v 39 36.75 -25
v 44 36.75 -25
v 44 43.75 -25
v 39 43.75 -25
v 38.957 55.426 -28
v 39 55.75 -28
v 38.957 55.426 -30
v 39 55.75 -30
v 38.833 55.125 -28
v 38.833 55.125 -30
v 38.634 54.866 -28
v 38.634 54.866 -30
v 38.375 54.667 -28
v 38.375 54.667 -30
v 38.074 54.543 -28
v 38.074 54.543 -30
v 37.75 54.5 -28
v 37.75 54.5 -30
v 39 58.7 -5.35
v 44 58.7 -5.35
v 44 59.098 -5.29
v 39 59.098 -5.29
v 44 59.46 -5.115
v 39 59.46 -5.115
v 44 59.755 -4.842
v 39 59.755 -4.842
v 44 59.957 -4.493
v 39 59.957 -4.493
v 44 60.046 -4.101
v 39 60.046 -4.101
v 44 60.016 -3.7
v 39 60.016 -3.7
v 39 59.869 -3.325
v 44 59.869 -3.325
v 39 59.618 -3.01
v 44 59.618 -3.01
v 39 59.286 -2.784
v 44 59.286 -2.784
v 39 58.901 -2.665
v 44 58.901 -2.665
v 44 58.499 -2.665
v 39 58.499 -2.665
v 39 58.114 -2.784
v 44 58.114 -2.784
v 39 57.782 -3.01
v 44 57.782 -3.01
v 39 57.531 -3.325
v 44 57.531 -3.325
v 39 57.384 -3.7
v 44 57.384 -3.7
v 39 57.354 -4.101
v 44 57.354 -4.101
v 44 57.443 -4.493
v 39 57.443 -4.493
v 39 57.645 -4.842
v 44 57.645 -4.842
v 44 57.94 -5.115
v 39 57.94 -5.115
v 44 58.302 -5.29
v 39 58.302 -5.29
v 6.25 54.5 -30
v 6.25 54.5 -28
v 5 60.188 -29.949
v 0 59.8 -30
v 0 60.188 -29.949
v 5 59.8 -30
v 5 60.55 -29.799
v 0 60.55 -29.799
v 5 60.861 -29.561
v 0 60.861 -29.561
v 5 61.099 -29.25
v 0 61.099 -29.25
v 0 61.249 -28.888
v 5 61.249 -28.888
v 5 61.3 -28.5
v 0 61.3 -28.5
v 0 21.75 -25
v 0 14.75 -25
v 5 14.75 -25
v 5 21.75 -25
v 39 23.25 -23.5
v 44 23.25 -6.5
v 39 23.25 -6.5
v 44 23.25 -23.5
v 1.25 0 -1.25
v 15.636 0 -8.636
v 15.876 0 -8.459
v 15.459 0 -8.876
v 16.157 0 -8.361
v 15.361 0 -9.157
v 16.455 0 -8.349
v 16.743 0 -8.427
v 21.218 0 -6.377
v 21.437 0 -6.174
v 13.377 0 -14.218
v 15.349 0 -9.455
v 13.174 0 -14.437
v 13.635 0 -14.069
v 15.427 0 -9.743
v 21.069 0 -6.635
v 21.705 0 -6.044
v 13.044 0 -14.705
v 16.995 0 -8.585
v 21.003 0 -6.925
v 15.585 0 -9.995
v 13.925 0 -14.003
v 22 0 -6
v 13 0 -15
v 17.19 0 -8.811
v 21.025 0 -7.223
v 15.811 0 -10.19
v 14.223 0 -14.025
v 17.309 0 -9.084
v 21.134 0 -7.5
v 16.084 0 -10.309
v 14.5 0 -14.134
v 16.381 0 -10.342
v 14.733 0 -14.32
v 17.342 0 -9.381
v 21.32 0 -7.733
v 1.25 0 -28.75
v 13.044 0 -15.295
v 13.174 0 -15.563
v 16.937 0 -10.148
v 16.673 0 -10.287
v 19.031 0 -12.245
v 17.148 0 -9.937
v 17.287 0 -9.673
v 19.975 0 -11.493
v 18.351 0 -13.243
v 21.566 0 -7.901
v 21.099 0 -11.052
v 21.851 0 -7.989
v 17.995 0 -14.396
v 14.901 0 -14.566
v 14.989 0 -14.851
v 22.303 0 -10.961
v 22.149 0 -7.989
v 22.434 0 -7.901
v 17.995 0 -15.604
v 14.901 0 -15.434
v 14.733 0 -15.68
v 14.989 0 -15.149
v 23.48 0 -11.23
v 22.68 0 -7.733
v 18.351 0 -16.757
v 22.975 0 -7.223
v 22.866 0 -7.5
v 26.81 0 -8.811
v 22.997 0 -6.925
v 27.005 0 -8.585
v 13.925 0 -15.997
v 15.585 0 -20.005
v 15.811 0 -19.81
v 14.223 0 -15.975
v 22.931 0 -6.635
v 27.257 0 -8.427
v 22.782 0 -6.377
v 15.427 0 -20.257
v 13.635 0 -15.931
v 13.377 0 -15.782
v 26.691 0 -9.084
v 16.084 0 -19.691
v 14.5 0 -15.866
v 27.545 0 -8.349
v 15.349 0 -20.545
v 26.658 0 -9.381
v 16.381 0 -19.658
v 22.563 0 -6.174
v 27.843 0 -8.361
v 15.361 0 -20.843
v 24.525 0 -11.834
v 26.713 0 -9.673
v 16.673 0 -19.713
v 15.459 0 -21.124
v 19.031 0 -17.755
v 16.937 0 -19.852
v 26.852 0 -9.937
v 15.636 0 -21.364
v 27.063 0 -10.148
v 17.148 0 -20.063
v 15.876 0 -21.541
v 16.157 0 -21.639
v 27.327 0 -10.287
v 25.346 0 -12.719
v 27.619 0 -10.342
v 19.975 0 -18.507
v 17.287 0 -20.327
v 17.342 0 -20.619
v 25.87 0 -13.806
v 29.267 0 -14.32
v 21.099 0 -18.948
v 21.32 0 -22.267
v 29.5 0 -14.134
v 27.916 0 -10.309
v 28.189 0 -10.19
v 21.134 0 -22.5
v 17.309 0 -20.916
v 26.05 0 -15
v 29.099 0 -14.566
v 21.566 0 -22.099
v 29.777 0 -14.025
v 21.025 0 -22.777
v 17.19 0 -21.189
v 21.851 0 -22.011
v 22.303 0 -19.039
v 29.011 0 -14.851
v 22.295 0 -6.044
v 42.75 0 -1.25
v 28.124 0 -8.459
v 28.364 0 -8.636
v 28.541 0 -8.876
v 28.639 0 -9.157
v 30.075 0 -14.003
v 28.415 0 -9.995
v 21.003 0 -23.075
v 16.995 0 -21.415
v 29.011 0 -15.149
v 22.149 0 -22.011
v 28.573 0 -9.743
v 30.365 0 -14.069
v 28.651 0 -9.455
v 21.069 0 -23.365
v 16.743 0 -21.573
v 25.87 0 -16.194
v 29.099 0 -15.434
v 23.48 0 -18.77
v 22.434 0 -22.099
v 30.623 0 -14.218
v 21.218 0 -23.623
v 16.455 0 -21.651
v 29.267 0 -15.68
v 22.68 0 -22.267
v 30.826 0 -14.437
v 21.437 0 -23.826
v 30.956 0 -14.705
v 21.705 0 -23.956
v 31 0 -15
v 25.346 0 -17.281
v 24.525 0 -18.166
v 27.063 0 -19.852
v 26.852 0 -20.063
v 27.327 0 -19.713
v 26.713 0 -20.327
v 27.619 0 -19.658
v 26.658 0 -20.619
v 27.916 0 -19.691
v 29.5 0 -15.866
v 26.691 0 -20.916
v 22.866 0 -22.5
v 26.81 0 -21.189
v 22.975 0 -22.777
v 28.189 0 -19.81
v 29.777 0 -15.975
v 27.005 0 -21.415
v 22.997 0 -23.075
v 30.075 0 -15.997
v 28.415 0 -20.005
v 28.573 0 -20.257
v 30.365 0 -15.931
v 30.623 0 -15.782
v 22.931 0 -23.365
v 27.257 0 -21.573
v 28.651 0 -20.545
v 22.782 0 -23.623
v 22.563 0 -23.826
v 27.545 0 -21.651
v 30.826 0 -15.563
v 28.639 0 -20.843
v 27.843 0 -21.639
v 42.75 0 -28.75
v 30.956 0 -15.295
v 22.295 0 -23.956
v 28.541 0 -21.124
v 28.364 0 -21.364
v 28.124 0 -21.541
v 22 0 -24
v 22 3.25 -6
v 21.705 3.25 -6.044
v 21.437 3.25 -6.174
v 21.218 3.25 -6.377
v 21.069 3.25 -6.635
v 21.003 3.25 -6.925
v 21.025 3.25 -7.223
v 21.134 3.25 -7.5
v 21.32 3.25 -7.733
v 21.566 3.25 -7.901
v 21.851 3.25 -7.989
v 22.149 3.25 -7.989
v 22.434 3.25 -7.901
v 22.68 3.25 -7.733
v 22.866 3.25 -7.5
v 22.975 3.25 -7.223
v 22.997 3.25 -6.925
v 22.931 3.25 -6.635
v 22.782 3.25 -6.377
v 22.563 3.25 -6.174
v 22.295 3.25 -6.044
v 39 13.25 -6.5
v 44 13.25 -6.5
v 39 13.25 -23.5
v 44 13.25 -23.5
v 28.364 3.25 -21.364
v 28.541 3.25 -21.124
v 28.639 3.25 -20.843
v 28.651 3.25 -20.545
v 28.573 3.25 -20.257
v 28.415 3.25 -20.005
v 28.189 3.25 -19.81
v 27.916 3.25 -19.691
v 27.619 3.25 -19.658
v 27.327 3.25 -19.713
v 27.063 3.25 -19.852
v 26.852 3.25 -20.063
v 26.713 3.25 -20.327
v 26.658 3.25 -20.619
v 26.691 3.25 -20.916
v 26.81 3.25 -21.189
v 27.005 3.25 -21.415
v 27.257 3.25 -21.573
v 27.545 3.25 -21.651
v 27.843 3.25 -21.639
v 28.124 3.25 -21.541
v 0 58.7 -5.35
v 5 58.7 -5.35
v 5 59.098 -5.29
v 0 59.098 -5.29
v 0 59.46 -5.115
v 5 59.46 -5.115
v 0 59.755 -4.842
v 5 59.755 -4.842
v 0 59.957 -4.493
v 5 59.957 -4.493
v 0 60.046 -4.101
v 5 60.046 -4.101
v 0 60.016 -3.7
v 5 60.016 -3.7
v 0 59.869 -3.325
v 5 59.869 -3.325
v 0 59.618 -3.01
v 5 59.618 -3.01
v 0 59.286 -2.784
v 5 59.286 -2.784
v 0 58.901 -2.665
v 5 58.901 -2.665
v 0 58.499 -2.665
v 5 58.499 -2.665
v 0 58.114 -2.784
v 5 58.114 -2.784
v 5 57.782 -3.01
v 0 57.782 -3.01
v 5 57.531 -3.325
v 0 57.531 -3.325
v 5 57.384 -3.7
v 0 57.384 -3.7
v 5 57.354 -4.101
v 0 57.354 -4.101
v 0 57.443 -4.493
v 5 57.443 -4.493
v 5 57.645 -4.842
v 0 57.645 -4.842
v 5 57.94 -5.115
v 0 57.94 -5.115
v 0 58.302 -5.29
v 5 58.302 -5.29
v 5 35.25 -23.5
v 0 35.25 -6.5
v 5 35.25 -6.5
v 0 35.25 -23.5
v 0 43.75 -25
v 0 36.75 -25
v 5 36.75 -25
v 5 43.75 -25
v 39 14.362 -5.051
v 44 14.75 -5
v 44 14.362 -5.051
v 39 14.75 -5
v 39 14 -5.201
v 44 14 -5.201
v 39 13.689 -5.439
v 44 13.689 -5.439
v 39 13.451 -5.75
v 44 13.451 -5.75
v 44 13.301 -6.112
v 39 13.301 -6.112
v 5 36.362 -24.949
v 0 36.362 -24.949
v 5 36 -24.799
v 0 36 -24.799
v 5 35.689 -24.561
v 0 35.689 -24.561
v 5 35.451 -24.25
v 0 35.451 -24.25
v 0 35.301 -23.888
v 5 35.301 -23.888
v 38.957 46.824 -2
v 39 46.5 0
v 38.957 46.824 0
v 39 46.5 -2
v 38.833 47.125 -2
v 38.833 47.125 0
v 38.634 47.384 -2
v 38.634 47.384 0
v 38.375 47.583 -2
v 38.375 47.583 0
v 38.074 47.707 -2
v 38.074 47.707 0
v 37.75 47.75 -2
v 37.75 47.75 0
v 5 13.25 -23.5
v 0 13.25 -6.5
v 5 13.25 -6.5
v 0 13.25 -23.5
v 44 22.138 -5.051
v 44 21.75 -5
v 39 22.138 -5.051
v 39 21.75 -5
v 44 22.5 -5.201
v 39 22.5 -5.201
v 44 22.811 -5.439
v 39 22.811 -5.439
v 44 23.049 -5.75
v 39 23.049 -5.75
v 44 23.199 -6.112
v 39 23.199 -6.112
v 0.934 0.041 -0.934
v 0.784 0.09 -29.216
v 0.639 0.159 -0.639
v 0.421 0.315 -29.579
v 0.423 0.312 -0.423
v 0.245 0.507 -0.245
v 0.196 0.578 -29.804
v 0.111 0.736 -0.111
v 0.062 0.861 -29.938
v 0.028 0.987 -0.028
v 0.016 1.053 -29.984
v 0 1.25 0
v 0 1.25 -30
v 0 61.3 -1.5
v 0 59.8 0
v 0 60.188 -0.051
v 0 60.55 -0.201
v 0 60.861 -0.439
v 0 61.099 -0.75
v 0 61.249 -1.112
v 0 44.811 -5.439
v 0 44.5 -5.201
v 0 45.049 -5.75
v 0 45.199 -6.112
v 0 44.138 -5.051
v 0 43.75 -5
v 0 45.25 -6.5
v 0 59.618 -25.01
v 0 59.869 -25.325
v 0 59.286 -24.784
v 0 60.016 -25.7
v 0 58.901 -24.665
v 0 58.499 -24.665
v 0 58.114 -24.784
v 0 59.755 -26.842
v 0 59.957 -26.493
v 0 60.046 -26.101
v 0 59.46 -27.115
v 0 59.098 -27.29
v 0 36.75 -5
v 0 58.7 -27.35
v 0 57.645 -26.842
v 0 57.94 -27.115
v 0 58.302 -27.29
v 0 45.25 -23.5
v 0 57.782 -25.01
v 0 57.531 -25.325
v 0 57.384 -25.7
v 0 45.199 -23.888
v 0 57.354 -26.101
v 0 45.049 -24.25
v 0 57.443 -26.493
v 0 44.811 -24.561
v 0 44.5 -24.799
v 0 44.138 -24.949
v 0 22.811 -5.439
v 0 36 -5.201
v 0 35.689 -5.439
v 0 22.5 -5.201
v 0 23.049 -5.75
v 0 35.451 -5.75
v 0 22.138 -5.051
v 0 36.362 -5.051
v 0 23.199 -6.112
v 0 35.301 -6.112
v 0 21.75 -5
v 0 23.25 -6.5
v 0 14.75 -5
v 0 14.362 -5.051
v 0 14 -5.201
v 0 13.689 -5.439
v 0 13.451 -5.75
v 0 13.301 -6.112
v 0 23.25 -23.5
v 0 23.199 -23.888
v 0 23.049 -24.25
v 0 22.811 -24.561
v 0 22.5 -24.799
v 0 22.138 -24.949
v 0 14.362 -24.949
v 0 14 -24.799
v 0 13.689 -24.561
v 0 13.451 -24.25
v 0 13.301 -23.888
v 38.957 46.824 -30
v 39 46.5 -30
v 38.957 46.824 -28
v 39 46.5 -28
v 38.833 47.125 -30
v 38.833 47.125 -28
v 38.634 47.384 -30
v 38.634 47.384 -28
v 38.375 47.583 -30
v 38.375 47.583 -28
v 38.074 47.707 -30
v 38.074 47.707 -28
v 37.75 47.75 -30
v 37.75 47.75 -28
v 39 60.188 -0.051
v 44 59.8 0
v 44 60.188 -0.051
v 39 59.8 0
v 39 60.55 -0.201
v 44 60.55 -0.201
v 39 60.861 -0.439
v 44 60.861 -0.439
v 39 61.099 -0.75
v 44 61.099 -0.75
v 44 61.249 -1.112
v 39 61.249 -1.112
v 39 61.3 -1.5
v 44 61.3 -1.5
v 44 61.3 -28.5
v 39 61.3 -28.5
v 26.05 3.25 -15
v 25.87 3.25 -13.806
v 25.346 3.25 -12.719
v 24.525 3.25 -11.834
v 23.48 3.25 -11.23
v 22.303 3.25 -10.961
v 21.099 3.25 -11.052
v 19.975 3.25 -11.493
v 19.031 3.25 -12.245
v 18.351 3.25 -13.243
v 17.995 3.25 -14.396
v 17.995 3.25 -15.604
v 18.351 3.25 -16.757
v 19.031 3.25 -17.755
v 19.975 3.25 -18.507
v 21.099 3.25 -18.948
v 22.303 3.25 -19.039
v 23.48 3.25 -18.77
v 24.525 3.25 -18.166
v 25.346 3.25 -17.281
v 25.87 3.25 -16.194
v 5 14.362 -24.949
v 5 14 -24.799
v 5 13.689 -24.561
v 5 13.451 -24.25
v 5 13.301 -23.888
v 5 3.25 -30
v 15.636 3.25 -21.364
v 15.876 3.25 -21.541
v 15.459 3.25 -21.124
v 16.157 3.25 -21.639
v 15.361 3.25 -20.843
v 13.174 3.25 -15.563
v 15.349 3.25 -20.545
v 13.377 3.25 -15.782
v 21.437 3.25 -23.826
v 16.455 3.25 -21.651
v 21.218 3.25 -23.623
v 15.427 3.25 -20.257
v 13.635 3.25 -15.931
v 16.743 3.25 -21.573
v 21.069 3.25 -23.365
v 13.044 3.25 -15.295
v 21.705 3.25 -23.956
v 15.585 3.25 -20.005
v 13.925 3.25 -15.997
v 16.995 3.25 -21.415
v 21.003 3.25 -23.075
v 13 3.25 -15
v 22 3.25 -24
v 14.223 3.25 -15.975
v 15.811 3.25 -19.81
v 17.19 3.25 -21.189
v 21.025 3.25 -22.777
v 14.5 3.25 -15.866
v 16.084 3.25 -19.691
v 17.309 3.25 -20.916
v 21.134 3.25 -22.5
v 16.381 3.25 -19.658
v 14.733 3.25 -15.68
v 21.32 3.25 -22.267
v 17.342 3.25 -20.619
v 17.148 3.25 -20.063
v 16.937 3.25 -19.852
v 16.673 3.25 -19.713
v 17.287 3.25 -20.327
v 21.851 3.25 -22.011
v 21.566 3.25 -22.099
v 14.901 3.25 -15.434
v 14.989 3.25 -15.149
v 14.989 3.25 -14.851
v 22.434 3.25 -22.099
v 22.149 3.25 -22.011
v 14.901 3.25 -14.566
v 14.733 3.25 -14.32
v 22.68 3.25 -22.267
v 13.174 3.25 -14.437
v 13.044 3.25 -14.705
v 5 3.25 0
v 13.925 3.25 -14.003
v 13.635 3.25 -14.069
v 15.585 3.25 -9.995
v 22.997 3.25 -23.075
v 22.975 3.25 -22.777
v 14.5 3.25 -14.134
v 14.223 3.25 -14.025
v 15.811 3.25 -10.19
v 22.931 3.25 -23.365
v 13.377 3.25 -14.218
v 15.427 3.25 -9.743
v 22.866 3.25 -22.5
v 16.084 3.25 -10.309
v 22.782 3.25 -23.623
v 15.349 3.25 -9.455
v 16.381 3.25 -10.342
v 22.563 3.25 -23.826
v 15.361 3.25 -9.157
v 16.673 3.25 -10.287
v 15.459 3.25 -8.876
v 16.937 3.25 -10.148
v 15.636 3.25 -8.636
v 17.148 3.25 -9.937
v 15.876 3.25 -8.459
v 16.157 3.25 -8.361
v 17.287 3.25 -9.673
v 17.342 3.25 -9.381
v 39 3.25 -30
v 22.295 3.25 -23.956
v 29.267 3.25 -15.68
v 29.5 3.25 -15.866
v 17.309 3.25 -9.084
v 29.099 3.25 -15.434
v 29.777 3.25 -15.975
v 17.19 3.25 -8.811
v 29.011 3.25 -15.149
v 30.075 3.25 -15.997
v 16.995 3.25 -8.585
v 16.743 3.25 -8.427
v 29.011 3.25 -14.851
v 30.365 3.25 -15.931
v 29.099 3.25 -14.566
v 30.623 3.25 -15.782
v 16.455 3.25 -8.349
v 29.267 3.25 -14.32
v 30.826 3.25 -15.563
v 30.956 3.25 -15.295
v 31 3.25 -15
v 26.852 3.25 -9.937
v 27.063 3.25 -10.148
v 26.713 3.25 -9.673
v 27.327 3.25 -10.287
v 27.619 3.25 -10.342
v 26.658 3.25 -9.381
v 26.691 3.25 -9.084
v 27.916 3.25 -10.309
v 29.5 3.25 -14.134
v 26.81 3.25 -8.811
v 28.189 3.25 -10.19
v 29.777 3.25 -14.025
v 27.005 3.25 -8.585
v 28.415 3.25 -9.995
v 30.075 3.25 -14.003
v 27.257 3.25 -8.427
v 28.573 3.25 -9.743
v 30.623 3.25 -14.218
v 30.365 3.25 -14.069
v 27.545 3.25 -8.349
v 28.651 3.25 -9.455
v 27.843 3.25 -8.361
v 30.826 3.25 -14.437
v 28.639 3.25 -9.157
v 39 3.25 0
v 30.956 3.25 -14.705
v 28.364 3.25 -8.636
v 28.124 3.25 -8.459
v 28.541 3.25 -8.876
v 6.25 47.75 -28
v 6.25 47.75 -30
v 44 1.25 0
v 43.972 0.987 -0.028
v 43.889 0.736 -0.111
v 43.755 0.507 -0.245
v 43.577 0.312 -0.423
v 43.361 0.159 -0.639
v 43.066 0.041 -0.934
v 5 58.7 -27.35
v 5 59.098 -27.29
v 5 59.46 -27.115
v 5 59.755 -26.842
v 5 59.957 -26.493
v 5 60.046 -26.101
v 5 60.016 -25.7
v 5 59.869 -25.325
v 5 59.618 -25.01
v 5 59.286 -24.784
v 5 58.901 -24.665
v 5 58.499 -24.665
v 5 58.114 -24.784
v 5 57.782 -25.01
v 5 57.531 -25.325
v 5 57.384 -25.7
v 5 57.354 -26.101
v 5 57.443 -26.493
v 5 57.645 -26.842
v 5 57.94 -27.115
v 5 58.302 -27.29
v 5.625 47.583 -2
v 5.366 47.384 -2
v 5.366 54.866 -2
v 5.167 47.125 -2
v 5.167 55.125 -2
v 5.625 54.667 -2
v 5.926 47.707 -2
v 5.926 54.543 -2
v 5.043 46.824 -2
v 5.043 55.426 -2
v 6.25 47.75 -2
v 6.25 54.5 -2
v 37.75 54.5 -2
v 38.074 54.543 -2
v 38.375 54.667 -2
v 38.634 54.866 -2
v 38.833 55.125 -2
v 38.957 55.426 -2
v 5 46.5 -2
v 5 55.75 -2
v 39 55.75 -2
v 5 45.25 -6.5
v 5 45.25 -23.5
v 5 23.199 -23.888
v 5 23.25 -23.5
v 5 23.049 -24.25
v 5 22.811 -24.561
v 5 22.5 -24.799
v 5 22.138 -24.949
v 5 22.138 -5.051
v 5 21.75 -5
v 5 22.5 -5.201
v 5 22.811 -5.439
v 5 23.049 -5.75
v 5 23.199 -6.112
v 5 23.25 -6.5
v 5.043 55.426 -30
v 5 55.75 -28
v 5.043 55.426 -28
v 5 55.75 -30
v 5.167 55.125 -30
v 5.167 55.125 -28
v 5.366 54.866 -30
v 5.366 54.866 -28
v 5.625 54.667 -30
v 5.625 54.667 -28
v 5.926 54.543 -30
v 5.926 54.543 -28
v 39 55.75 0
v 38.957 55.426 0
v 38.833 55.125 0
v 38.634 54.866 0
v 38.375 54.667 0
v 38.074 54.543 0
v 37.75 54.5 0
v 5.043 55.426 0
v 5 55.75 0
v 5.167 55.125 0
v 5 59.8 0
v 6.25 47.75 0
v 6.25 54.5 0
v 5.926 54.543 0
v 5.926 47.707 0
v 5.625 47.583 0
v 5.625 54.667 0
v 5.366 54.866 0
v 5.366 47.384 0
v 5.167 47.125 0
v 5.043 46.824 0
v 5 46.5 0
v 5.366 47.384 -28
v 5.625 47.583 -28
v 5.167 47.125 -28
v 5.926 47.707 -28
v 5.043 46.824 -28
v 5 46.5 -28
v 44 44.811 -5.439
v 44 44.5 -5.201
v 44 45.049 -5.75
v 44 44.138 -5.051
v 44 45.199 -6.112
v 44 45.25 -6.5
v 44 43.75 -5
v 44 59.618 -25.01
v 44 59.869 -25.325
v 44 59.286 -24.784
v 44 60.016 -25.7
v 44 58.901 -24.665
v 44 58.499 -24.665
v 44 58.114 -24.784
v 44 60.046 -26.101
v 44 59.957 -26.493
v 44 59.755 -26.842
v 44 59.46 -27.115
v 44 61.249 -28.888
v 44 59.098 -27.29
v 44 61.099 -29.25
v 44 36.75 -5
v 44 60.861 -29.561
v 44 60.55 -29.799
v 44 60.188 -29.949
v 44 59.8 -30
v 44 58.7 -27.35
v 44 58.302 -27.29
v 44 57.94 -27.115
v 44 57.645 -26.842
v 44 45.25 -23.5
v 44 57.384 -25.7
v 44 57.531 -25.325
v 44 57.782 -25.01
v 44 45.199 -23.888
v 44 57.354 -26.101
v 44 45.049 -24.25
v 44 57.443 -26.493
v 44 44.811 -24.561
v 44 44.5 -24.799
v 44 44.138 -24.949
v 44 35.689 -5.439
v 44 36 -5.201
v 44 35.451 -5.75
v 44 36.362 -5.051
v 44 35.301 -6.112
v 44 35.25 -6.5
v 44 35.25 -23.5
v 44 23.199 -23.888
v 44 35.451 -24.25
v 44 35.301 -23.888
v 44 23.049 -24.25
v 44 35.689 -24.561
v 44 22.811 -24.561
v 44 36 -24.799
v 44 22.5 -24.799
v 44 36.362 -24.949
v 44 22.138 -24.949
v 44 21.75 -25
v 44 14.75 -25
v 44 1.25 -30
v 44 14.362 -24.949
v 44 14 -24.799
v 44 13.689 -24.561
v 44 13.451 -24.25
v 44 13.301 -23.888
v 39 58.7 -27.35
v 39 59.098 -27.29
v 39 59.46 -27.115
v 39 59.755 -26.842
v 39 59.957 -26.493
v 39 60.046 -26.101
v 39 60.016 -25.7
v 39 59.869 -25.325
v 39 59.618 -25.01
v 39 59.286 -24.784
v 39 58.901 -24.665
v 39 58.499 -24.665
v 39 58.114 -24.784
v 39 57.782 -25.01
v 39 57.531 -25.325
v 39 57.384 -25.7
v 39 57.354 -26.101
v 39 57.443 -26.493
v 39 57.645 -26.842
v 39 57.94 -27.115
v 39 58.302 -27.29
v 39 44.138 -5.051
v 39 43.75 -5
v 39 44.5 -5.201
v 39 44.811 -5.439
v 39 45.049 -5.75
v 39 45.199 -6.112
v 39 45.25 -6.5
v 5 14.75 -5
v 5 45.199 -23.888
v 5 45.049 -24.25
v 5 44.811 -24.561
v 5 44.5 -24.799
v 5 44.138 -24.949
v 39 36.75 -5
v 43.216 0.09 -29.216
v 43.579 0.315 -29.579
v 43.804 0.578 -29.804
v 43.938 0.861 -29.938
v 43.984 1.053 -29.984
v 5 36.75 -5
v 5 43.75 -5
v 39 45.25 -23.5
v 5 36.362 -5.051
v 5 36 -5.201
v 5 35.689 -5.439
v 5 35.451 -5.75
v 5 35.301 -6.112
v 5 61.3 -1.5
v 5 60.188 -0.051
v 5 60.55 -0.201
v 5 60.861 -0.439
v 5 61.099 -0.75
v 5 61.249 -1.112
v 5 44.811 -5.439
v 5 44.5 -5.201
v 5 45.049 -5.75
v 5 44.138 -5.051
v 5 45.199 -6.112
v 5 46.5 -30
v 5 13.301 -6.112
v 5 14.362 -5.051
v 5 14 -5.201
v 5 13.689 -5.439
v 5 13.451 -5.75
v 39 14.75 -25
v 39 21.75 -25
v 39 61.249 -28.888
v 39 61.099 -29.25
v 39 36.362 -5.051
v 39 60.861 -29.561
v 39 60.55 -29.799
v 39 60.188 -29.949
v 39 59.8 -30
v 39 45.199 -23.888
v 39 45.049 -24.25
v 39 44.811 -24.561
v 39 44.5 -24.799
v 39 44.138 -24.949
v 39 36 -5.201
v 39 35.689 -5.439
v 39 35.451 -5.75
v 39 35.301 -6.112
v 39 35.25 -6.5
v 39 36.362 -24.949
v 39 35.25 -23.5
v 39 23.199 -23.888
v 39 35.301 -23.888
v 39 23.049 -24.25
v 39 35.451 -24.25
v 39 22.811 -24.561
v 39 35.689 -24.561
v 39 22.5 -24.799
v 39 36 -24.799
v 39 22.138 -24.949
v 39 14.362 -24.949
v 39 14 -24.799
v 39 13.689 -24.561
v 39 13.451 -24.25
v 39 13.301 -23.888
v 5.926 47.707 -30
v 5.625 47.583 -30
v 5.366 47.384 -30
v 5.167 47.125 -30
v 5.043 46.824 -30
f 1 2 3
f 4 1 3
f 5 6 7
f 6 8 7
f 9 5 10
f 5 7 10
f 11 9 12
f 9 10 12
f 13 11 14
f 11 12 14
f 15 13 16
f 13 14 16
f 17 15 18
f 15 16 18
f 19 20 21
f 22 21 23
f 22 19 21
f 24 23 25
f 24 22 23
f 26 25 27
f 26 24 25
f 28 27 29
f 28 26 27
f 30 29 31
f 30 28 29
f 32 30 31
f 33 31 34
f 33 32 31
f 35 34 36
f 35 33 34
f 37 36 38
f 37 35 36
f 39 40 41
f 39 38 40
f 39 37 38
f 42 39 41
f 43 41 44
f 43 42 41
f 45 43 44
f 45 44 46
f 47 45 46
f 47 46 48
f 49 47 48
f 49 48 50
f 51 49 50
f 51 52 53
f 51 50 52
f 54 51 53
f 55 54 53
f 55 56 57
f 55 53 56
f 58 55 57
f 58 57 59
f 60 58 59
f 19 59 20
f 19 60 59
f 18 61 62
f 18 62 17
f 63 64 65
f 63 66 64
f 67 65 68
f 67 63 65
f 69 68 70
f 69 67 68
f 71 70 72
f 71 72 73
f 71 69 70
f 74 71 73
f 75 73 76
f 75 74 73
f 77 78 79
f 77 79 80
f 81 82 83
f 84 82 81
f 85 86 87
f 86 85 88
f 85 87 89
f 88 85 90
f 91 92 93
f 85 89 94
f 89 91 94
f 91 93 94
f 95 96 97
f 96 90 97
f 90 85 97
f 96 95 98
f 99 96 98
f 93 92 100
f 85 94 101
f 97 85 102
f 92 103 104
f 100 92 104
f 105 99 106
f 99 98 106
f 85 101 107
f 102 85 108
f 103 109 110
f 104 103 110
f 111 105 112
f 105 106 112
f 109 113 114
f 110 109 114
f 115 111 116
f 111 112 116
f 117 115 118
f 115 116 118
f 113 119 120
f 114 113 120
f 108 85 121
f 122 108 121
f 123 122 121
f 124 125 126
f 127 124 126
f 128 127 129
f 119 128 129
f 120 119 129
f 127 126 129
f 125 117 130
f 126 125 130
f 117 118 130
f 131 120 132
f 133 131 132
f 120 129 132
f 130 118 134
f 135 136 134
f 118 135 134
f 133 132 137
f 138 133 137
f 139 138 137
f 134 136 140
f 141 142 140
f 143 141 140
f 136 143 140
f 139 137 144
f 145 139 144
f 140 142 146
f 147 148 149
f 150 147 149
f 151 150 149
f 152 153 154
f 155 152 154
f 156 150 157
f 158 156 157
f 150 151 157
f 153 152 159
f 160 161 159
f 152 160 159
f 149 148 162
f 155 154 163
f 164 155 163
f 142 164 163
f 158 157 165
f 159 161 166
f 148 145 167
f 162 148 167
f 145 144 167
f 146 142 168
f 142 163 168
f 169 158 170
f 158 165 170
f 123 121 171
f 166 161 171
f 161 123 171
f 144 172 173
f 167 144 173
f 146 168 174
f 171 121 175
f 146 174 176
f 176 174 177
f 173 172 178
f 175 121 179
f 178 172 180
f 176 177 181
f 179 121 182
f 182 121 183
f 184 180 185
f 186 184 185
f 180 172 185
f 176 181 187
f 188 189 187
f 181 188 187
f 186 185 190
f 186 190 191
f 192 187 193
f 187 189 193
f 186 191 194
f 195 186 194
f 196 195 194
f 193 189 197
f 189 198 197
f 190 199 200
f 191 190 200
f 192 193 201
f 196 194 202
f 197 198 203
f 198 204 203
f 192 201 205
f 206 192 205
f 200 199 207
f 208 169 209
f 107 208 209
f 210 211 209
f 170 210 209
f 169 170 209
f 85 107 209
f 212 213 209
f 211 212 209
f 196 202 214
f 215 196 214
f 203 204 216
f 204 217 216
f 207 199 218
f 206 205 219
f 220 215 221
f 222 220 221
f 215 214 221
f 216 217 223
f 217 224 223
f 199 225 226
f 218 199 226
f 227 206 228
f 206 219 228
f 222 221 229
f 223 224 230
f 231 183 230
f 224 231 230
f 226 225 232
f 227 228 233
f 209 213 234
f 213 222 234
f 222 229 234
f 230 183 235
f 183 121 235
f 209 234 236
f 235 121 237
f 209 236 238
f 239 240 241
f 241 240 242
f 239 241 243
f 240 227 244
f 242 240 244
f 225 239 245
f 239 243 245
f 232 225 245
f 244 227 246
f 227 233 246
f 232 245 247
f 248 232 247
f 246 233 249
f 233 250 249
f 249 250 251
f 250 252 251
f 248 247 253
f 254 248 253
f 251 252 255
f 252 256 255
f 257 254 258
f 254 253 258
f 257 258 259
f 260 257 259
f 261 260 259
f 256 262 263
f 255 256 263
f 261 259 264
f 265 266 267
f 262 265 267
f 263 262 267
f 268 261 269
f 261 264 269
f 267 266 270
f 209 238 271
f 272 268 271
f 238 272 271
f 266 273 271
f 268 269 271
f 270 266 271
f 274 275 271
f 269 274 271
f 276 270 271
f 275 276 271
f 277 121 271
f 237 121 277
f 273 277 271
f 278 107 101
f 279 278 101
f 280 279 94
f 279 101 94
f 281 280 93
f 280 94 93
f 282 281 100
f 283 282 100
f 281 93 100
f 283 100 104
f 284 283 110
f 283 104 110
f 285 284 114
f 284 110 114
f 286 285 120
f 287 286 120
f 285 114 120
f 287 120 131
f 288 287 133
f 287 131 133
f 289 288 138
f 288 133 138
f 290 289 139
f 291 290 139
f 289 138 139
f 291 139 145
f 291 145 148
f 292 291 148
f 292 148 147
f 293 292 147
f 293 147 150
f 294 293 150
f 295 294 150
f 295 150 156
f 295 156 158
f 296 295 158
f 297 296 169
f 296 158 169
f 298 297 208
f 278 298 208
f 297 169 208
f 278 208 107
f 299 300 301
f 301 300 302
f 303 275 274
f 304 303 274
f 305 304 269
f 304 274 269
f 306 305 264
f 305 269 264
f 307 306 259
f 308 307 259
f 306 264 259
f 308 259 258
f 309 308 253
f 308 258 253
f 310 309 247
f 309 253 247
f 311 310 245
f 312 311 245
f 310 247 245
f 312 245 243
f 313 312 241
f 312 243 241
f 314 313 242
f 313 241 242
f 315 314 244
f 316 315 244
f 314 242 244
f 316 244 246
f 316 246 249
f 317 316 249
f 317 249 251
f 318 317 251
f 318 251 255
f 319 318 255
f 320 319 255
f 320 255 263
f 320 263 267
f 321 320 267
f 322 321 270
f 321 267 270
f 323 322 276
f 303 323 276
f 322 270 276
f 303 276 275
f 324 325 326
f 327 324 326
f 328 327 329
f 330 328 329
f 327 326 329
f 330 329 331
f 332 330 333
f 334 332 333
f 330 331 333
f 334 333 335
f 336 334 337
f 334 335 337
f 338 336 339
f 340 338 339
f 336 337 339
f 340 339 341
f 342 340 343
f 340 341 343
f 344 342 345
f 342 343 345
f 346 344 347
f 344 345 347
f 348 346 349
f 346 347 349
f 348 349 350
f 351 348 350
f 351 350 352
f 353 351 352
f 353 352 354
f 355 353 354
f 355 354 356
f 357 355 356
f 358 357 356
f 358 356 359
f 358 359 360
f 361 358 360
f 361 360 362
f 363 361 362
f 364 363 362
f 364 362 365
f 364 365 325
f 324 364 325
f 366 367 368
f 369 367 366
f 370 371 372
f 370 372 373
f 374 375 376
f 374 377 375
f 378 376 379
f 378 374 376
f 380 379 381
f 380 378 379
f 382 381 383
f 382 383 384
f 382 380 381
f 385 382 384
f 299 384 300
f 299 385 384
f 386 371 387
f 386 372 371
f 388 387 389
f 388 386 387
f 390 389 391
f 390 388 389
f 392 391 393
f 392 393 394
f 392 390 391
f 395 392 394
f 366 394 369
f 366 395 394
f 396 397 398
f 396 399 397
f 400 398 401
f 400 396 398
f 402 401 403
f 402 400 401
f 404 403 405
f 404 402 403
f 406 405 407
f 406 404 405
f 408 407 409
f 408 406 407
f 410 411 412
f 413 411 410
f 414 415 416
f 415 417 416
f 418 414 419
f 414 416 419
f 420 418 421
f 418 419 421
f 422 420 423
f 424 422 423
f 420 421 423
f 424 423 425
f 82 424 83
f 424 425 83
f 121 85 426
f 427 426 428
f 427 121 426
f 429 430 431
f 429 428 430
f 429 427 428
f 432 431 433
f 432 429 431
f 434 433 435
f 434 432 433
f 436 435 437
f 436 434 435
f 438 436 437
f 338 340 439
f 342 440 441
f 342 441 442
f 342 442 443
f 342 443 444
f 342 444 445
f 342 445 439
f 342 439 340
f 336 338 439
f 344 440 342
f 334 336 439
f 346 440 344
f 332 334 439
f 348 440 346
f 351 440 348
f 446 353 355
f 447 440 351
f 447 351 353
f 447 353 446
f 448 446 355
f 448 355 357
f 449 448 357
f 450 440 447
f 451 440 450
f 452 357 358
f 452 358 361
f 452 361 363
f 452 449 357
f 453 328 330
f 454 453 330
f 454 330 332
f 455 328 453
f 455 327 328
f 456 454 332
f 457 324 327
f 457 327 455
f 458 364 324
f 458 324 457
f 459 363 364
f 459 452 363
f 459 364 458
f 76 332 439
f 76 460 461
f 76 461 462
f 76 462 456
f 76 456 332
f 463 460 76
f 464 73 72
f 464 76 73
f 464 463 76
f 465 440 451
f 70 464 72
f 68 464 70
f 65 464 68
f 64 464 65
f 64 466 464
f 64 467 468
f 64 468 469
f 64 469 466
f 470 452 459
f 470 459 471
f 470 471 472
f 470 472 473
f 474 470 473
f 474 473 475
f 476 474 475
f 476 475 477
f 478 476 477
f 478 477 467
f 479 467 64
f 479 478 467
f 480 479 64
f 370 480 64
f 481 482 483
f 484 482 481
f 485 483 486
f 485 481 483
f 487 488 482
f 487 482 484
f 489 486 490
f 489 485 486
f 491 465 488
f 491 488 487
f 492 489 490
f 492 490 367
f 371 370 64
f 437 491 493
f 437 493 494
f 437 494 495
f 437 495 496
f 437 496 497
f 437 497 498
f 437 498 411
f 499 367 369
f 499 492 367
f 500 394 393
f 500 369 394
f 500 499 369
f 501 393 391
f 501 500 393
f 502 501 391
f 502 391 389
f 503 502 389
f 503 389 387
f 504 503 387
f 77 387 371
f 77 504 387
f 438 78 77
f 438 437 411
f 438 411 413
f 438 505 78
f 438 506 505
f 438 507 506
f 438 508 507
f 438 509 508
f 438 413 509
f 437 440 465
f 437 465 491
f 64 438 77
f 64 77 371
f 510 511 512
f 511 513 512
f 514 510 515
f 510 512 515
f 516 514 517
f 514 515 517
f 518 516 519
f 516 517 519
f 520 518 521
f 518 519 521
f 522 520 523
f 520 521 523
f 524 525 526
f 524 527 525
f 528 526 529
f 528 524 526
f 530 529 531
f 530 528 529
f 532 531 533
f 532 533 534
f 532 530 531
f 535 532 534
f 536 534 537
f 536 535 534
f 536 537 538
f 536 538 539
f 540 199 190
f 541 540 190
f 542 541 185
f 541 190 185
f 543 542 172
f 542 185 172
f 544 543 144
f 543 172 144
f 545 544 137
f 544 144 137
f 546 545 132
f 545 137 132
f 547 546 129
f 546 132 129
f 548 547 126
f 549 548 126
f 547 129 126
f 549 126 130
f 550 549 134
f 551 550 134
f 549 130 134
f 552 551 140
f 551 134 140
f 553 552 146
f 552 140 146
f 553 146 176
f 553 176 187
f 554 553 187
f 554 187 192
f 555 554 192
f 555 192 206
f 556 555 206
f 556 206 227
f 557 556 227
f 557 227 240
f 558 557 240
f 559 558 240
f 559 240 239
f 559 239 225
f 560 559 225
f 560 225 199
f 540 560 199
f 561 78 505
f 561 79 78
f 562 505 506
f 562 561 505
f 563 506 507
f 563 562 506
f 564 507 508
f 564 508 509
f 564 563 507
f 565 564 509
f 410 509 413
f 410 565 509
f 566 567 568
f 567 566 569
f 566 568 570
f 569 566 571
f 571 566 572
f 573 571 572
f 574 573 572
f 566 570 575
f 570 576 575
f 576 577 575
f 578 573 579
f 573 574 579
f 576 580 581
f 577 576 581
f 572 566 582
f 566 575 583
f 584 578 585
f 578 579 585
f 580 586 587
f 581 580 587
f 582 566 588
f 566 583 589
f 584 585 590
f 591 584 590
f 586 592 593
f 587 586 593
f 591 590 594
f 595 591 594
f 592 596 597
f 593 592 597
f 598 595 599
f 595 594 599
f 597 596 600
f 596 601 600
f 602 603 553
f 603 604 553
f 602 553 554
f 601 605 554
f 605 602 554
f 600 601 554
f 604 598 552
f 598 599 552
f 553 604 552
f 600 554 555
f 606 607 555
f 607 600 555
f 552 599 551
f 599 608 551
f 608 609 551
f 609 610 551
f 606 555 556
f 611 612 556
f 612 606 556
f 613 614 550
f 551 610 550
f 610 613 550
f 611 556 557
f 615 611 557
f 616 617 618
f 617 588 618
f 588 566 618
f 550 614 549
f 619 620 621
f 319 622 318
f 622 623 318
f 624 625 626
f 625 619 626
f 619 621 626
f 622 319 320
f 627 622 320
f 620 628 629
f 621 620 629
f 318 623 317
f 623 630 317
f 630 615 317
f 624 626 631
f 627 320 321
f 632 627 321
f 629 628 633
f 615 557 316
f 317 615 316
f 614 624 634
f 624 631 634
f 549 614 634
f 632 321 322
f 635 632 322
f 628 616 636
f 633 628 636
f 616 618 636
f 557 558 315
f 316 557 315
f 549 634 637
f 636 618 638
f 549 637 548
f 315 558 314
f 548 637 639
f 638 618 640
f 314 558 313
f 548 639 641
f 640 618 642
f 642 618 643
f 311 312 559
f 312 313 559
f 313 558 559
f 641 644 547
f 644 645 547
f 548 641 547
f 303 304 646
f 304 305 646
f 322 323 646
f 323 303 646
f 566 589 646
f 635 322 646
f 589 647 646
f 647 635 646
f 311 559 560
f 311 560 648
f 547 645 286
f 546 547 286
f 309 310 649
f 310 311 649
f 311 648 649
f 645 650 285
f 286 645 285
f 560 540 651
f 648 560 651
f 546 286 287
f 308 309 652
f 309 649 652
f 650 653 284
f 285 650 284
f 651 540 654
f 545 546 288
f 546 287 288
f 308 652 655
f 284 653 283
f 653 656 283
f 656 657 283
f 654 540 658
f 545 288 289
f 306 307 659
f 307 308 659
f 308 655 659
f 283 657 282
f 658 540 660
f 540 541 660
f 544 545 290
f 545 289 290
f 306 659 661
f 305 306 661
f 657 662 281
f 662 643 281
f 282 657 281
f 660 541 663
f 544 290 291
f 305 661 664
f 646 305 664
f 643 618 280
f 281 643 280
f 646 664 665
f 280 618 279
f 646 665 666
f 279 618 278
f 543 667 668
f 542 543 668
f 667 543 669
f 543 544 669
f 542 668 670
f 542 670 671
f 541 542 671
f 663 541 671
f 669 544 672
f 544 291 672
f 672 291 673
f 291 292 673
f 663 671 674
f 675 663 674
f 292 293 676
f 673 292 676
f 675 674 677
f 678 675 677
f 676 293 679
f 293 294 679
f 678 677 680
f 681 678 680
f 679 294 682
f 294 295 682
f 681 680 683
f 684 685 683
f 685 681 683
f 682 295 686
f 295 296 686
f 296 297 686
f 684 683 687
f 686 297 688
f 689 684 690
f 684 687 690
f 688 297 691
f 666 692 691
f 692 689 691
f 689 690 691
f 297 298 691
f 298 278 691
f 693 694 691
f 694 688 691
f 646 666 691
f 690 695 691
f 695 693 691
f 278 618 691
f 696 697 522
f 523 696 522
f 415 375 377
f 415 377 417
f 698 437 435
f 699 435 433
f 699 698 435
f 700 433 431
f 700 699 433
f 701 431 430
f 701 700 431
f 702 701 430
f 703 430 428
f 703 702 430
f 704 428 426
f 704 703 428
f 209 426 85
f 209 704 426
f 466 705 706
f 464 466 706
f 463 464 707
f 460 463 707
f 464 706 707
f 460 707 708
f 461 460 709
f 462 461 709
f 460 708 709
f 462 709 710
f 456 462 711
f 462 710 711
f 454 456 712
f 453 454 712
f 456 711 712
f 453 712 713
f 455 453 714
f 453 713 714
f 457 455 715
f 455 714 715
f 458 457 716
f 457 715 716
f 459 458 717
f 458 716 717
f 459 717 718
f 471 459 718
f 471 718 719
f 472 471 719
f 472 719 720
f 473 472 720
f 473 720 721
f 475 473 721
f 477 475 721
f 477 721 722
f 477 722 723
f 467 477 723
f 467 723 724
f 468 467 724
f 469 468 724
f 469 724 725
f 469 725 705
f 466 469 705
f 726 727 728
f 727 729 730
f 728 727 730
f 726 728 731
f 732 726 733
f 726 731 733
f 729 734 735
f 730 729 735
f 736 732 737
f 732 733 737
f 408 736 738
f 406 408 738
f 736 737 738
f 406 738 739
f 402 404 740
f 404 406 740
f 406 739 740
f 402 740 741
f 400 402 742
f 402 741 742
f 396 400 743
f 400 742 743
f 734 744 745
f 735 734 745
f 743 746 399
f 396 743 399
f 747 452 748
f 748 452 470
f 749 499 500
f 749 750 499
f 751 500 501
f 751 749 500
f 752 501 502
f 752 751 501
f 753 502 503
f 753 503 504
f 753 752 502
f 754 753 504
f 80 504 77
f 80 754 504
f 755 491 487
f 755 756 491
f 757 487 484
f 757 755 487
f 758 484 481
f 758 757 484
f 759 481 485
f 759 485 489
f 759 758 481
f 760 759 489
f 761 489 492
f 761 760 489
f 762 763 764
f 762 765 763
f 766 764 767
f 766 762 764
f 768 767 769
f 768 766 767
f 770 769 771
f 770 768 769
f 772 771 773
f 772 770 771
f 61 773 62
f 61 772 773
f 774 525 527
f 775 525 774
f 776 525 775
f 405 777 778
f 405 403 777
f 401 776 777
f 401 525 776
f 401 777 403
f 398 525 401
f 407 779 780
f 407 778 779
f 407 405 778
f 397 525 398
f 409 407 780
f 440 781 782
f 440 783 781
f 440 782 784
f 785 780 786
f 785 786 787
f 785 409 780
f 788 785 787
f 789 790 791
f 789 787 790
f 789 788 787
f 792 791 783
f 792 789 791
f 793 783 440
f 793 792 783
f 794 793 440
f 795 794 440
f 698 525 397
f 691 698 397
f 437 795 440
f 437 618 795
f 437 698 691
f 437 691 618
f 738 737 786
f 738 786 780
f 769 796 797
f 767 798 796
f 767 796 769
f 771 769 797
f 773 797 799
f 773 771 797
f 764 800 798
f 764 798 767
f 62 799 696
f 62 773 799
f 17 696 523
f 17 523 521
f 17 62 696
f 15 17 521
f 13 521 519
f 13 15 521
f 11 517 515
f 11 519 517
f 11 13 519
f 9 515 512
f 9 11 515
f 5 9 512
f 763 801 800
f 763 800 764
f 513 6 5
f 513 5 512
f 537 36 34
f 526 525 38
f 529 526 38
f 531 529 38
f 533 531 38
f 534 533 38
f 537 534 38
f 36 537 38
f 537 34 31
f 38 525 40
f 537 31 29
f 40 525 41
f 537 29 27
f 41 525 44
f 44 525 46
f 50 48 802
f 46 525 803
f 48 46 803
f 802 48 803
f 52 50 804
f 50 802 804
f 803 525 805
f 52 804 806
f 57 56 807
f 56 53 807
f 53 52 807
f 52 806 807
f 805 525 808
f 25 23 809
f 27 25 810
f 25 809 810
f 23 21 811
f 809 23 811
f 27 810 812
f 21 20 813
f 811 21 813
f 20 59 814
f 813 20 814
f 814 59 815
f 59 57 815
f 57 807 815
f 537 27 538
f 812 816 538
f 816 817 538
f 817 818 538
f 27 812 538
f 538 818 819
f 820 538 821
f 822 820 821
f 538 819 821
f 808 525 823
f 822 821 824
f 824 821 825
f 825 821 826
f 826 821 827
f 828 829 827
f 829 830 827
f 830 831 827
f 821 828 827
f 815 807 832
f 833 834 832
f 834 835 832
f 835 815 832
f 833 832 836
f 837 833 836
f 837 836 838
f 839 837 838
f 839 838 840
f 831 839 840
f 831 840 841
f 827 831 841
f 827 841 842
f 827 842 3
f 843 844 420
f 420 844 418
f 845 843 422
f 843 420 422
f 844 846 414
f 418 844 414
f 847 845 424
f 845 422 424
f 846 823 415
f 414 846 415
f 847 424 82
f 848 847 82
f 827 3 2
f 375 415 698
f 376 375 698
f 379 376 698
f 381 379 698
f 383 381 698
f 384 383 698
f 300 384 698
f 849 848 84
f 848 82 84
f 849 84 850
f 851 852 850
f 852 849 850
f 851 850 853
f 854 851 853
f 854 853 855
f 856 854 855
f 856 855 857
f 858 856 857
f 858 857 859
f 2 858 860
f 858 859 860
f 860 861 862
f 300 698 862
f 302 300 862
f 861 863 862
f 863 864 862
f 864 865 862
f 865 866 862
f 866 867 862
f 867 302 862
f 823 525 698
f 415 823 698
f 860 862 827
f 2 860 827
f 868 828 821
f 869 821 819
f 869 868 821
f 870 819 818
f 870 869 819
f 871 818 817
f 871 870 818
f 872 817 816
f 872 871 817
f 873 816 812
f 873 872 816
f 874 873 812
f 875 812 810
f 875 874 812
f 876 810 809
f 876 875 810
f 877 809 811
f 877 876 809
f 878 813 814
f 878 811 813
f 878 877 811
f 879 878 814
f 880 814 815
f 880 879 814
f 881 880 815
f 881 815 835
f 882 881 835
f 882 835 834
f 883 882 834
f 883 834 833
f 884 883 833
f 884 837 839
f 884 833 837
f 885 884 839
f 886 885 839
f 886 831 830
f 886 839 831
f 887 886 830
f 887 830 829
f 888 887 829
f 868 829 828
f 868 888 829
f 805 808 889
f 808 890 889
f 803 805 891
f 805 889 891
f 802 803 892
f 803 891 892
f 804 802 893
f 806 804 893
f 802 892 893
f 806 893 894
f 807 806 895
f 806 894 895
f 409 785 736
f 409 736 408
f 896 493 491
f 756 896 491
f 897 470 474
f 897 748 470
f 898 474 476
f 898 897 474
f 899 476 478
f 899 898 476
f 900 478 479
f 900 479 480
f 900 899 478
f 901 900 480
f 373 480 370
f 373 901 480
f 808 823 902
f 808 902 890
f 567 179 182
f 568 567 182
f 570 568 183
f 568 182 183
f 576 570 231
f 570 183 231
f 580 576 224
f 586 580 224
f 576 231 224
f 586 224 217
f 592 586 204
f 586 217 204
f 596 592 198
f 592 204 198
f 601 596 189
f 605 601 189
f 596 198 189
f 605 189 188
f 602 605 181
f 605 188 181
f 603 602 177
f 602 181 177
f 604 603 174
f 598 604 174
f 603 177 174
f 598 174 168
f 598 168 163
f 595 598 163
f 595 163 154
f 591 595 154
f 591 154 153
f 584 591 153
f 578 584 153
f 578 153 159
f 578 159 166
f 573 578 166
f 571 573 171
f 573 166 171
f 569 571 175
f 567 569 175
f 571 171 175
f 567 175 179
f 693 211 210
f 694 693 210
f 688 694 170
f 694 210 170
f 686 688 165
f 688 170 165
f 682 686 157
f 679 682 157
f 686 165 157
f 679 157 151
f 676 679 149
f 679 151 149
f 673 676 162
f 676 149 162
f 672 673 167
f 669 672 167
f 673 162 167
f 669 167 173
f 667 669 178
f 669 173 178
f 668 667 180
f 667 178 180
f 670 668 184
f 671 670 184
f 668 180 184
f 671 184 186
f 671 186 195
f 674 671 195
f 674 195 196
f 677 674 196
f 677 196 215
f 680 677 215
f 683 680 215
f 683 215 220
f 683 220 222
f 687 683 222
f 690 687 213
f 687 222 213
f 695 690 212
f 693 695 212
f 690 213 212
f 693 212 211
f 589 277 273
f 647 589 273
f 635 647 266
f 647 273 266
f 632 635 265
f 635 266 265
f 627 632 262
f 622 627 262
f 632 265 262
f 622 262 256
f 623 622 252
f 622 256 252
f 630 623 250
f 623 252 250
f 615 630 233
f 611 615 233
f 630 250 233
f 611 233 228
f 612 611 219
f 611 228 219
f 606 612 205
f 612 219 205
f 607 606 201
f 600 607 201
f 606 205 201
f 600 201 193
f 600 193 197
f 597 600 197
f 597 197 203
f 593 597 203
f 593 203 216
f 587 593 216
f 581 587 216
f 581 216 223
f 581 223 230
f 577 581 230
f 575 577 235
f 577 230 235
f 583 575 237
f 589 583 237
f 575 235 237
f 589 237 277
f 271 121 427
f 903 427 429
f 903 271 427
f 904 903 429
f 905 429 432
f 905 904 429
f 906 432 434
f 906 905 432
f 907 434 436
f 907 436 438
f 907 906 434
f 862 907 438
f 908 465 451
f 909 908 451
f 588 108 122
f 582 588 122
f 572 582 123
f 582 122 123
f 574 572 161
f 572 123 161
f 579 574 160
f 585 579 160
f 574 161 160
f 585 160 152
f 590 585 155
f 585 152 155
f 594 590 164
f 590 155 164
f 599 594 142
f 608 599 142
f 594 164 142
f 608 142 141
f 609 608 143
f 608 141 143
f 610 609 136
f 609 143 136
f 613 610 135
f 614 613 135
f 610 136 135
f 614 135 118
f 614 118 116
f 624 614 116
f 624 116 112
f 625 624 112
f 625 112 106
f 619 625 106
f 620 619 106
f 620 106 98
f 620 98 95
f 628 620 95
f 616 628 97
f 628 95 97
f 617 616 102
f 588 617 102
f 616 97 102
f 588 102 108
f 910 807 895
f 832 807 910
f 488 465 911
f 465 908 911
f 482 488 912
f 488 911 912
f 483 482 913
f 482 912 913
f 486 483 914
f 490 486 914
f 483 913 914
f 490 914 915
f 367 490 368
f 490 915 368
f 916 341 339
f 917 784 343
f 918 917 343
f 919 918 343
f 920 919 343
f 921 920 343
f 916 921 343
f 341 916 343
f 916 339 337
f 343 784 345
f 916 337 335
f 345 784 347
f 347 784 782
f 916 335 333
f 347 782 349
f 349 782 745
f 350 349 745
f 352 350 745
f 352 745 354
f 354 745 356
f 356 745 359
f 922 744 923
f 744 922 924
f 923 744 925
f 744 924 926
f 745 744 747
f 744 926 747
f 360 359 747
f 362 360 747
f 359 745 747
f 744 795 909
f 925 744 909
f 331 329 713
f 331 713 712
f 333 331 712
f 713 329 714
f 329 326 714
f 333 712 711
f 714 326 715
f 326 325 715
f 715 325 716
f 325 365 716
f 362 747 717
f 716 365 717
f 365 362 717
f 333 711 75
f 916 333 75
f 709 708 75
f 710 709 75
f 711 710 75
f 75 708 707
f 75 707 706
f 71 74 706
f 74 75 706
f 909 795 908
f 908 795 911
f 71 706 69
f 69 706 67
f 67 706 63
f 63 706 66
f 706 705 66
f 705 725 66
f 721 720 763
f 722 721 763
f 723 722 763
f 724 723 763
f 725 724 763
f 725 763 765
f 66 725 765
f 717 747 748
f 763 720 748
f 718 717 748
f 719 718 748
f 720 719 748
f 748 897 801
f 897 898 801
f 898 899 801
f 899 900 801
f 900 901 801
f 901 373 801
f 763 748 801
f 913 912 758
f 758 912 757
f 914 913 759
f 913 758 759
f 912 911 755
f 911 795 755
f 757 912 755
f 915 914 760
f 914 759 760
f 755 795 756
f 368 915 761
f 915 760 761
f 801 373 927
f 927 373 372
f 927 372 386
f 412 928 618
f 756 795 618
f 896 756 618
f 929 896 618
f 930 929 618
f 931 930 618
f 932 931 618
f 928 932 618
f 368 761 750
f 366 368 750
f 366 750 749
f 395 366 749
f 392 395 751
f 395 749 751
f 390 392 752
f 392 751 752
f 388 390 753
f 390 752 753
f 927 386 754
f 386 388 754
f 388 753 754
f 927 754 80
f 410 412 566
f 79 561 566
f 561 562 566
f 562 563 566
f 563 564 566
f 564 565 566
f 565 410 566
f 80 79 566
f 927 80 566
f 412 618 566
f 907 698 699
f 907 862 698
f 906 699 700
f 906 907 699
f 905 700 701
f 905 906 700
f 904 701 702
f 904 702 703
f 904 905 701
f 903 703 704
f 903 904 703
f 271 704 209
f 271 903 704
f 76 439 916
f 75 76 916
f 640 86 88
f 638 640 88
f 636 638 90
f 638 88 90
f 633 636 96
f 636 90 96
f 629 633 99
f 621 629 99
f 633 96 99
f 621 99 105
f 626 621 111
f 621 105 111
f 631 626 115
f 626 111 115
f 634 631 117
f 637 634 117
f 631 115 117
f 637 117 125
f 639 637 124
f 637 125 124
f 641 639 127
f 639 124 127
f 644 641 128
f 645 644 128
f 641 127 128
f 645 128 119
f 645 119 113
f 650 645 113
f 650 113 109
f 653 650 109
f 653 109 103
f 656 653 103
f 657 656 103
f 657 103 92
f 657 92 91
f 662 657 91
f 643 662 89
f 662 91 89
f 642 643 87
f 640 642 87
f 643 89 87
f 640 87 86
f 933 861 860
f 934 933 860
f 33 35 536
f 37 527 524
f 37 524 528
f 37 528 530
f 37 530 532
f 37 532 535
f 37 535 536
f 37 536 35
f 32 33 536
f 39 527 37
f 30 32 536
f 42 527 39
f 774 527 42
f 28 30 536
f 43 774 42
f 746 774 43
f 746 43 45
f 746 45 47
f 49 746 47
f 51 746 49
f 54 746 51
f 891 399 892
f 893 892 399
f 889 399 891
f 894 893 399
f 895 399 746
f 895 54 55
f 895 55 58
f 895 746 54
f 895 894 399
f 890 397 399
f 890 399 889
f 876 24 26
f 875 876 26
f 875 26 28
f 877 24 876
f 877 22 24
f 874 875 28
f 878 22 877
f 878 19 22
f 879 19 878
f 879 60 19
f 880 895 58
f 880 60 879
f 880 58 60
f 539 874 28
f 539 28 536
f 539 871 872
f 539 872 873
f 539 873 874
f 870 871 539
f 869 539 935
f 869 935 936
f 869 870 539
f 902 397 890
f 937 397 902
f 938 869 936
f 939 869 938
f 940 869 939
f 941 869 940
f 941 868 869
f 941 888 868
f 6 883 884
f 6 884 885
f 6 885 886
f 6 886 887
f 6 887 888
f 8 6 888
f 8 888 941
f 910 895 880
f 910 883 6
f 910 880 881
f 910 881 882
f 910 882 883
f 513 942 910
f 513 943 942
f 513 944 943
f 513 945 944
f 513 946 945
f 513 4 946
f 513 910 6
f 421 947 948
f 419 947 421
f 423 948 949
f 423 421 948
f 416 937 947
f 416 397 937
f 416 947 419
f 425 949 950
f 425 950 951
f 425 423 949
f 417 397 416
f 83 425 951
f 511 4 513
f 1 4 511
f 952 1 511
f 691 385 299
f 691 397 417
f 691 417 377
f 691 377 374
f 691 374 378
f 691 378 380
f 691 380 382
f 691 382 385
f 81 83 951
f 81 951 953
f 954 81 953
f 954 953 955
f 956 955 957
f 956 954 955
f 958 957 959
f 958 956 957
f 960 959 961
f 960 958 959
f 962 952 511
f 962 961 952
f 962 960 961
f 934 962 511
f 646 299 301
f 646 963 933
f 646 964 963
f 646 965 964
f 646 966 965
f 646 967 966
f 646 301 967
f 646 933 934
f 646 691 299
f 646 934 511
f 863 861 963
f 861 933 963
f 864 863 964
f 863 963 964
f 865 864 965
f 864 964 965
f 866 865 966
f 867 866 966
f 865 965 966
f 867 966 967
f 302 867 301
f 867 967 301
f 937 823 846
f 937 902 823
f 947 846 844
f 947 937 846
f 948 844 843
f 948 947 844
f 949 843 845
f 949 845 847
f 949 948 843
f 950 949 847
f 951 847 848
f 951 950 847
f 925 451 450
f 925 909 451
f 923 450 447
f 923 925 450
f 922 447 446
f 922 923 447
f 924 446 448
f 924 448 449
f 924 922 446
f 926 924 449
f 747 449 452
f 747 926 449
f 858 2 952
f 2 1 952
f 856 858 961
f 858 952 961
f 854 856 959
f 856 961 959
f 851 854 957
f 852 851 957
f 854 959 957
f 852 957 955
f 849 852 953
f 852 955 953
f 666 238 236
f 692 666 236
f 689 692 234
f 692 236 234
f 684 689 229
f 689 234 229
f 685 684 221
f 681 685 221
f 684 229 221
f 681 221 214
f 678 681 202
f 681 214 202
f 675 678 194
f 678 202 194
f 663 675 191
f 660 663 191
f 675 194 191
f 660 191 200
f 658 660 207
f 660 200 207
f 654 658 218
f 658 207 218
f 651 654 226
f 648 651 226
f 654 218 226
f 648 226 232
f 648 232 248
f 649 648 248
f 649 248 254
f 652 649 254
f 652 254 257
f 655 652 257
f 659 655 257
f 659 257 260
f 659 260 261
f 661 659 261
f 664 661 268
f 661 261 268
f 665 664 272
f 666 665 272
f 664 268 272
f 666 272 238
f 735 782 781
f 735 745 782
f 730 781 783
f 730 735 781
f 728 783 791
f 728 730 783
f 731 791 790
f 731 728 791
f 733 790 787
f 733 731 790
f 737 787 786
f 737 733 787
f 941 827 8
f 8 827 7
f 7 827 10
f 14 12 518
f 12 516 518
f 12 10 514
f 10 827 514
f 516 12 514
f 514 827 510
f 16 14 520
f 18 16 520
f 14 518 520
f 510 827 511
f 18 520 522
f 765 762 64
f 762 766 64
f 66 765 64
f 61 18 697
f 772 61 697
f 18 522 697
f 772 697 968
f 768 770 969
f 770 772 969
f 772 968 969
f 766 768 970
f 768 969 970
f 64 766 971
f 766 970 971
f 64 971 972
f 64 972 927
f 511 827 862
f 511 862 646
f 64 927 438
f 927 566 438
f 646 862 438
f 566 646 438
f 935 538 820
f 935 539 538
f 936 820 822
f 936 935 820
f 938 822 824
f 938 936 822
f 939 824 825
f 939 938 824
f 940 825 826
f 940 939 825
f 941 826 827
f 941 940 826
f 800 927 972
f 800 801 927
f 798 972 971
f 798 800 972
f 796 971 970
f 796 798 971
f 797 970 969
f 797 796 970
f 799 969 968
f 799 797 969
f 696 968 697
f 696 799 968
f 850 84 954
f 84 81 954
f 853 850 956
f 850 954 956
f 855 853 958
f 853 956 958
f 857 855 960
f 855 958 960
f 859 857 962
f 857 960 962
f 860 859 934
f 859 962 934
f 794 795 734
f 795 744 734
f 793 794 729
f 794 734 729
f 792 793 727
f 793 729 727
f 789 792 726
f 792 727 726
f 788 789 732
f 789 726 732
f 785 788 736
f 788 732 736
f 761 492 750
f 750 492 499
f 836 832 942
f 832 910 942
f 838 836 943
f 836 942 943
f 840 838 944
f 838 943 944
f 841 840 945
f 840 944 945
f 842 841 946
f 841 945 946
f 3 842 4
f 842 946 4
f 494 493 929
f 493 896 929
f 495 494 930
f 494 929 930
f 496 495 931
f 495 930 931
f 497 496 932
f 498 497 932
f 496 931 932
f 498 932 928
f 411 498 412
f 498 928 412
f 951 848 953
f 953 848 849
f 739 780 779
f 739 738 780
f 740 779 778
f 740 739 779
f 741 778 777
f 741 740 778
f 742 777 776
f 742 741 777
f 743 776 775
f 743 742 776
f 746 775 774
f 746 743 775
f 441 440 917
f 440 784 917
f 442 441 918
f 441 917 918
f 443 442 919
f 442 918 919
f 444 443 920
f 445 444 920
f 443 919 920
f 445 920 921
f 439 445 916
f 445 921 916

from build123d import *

# Parameters (mm, degrees)
SKETCH1_W            = 44
SKETCH1_H            = 30
BOSS_EXTRUDE1_DEPTH  = 54.5
SKETCH5_W            = 5
SKETCH5_H            = 30
BOSS_EXTRUDE3_DEPTH  = 6.8
SKETCH9_R            = 1.35
CUT_EXTRUDE6_DEPTH   = 6
FILLET1_R            = 1.5
FILLET2_R            = 1.25
SKETCH11_W           = 34
SKETCH11_H           = 26
CUT_EXTRUDE7_DEPTH   = 51.25
SKETCH13_R           = 4.05
SKETCH13_R_2         = 1
CUT_EXTRUDE8_DEPTH   = 3.25
CIRPATTERN1_COUNT    = 8
SKETCH15_W           = 20
SKETCH15_H           = 10
CUT_EXTRUDE10_DEPTH  = 5
FILLET6_R            = 1.5
FILLET6_OF_MIRROR4_R = 1.5
SKETCH16_W           = 34
SKETCH16_H           = 44.5
CUT_EXTRUDE11_DEPTH  = 2
FILLET7_R            = 1.25


with BuildPart() as part:
    # Sketch1 → Boss-Extrude1 (new body)
    with BuildSketch(Plane(origin=(0, 0, 0), x_dir=(1, 0, 0), z_dir=(0, 1, 0))):
        with Locations((22, 15)):
            Rectangle(SKETCH1_W, SKETCH1_H)
    extrude(amount=BOSS_EXTRUDE1_DEPTH)

    # Sketch5 → Boss-Extrude3 (add)
    with BuildSketch(Plane(origin=(0, 54.5, 0), x_dir=(1, 0, 0), z_dir=(0, 1, 0))):
        with Locations((2.5, 15)):
            Rectangle(SKETCH5_W, SKETCH5_H)
    boss_extrude3 = extrude(amount=BOSS_EXTRUDE3_DEPTH)

    # Sketch9 → Cut-Extrude6 (cut, through all)
    with BuildSketch(Plane(origin=(5, 0, 0), x_dir=(0, 0, -1), z_dir=(1, 0, 0))):
        with Locations((26, 58.7)):
            Circle(SKETCH9_R)
        with Locations((4, 58.7)):
            Circle(SKETCH9_R)
    cut_extrude6 = extrude(amount=-CUT_EXTRUDE6_DEPTH, mode=Mode.SUBTRACT)

    # Mirror2: Boss-Extrude3, Cut-Extrude6 across plane
    add(boss_extrude3.mirror(Plane.ZY.offset(-22)))
    add(cut_extrude6.mirror(Plane.ZY.offset(-22)), mode=Mode.SUBTRACT)

    # Fillet1
    fillet1_edges = [part.edges().sort_by_distance(p)[0] for p in [
        (2.5, 61.3, 0),
        (2.5, 61.3, -30),
        (41.5, 61.3, -30),
        (41.5, 61.3, 0),
    ]]
    fillet(fillet1_edges, radius=FILLET1_R)

    # Fillet2
    fillet2_edges = [part.edges().sort_by_distance(p)[0] for p in [
        (22, 0, -30),
        (44, 0, -15),
        (22, 0, 0),
        (0, 0, -15),
    ]]
    fillet(fillet2_edges, radius=FILLET2_R)

    # Sketch11 → Cut-Extrude7 (cut)
    with BuildSketch(Plane(origin=(0, 54.5, 0), x_dir=(1, 0, 0), z_dir=(0, 1, 0))):
        with Locations((22, 15)):
            Rectangle(SKETCH11_W, SKETCH11_H)
    extrude(amount=-CUT_EXTRUDE7_DEPTH, mode=Mode.SUBTRACT)

    # Sketch13 → Cut-Extrude8 (cut)
    with BuildSketch(Plane.XZ):
        with Locations((22, -15)):
            Circle(SKETCH13_R)
        with Locations((30, -15)):
            Circle(SKETCH13_R_2)
    cut_extrude8 = extrude(amount=-CUT_EXTRUDE8_DEPTH, mode=Mode.SUBTRACT)

    # CirPattern1: Cut-Extrude8 ×8 about axis
    cirpattern1_axis = Axis((22, 0, -15), (0, 1, 0))
    for i in range(1, CIRPATTERN1_COUNT):
        add(cut_extrude8.rotate(cirpattern1_axis, i * 360 / CIRPATTERN1_COUNT), mode=Mode.SUBTRACT)

    # Sketch15 → Cut-Extrude10 (cut)
    with BuildSketch(Plane(origin=(44, 0, 0), x_dir=(0, 0, -1), z_dir=(1, 0, 0))):
        with Locations((15, 18.25)):
            Rectangle(SKETCH15_W, SKETCH15_H)
        with Locations((15, 40.25)):
            Rectangle(SKETCH15_W, SKETCH15_H)
    cut_extrude10 = extrude(amount=-CUT_EXTRUDE10_DEPTH, mode=Mode.SUBTRACT)

    # Fillet6
    fillet6_edges = [part.edges().sort_by_distance(p)[0] for p in [
        (41.5, 23.25, -5),
        (41.5, 13.25, -5),
        (41.5, 13.25, -25),
        (41.5, 23.25, -25),
        (41.5, 45.25, -5),
        (41.5, 35.25, -5),
        (41.5, 35.25, -25),
        (41.5, 45.25, -25),
    ]]
    fillet(fillet6_edges, radius=FILLET6_R)

    # Mirror4: Cut-Extrude10 across plane
    add(cut_extrude10.mirror(Plane.ZY.offset(-22)), mode=Mode.SUBTRACT)

    # Fillet6 of Mirror4
    fillet6_of_mirror4_edges = [part.edges().sort_by_distance(p)[0] for p in [
        (2.5, 23.25, -5),
        (2.5, 13.25, -5),
        (2.5, 13.25, -25),
        (2.5, 23.25, -25),
        (2.5, 45.25, -5),
        (2.5, 35.25, -5),
        (2.5, 35.25, -25),
        (2.5, 45.25, -25),
    ]]
    fillet(fillet6_of_mirror4_edges, radius=FILLET6_OF_MIRROR4_R)

    # Sketch16 → Cut-Extrude11 (cut)
    with BuildSketch(Plane.XY):
        with Locations((22, 25.5)):
            Rectangle(SKETCH16_W, SKETCH16_H)
    cut_extrude11 = extrude(amount=-CUT_EXTRUDE11_DEPTH, mode=Mode.SUBTRACT)

    # Mirror5: Cut-Extrude11 across plane
    add(cut_extrude11.mirror(Plane(origin=(0, 0, -15), x_dir=(1, 0, 0), z_dir=(0, 0, -1))), mode=Mode.SUBTRACT)

    # Fillet7
    fillet7_edges = [part.edges().sort_by_distance(p)[0] for p in [
        (5, 54.5, -1),
        (5, 47.75, -1),
        (39, 47.75, -1),
        (5, 47.75, -29),
        (39, 47.75, -29),
        (39, 54.5, -1),
        (39, 54.5, -29),
        (5, 54.5, -29),
    ]]
    fillet(fillet7_edges, radius=FILLET7_R)


solid = part.part
